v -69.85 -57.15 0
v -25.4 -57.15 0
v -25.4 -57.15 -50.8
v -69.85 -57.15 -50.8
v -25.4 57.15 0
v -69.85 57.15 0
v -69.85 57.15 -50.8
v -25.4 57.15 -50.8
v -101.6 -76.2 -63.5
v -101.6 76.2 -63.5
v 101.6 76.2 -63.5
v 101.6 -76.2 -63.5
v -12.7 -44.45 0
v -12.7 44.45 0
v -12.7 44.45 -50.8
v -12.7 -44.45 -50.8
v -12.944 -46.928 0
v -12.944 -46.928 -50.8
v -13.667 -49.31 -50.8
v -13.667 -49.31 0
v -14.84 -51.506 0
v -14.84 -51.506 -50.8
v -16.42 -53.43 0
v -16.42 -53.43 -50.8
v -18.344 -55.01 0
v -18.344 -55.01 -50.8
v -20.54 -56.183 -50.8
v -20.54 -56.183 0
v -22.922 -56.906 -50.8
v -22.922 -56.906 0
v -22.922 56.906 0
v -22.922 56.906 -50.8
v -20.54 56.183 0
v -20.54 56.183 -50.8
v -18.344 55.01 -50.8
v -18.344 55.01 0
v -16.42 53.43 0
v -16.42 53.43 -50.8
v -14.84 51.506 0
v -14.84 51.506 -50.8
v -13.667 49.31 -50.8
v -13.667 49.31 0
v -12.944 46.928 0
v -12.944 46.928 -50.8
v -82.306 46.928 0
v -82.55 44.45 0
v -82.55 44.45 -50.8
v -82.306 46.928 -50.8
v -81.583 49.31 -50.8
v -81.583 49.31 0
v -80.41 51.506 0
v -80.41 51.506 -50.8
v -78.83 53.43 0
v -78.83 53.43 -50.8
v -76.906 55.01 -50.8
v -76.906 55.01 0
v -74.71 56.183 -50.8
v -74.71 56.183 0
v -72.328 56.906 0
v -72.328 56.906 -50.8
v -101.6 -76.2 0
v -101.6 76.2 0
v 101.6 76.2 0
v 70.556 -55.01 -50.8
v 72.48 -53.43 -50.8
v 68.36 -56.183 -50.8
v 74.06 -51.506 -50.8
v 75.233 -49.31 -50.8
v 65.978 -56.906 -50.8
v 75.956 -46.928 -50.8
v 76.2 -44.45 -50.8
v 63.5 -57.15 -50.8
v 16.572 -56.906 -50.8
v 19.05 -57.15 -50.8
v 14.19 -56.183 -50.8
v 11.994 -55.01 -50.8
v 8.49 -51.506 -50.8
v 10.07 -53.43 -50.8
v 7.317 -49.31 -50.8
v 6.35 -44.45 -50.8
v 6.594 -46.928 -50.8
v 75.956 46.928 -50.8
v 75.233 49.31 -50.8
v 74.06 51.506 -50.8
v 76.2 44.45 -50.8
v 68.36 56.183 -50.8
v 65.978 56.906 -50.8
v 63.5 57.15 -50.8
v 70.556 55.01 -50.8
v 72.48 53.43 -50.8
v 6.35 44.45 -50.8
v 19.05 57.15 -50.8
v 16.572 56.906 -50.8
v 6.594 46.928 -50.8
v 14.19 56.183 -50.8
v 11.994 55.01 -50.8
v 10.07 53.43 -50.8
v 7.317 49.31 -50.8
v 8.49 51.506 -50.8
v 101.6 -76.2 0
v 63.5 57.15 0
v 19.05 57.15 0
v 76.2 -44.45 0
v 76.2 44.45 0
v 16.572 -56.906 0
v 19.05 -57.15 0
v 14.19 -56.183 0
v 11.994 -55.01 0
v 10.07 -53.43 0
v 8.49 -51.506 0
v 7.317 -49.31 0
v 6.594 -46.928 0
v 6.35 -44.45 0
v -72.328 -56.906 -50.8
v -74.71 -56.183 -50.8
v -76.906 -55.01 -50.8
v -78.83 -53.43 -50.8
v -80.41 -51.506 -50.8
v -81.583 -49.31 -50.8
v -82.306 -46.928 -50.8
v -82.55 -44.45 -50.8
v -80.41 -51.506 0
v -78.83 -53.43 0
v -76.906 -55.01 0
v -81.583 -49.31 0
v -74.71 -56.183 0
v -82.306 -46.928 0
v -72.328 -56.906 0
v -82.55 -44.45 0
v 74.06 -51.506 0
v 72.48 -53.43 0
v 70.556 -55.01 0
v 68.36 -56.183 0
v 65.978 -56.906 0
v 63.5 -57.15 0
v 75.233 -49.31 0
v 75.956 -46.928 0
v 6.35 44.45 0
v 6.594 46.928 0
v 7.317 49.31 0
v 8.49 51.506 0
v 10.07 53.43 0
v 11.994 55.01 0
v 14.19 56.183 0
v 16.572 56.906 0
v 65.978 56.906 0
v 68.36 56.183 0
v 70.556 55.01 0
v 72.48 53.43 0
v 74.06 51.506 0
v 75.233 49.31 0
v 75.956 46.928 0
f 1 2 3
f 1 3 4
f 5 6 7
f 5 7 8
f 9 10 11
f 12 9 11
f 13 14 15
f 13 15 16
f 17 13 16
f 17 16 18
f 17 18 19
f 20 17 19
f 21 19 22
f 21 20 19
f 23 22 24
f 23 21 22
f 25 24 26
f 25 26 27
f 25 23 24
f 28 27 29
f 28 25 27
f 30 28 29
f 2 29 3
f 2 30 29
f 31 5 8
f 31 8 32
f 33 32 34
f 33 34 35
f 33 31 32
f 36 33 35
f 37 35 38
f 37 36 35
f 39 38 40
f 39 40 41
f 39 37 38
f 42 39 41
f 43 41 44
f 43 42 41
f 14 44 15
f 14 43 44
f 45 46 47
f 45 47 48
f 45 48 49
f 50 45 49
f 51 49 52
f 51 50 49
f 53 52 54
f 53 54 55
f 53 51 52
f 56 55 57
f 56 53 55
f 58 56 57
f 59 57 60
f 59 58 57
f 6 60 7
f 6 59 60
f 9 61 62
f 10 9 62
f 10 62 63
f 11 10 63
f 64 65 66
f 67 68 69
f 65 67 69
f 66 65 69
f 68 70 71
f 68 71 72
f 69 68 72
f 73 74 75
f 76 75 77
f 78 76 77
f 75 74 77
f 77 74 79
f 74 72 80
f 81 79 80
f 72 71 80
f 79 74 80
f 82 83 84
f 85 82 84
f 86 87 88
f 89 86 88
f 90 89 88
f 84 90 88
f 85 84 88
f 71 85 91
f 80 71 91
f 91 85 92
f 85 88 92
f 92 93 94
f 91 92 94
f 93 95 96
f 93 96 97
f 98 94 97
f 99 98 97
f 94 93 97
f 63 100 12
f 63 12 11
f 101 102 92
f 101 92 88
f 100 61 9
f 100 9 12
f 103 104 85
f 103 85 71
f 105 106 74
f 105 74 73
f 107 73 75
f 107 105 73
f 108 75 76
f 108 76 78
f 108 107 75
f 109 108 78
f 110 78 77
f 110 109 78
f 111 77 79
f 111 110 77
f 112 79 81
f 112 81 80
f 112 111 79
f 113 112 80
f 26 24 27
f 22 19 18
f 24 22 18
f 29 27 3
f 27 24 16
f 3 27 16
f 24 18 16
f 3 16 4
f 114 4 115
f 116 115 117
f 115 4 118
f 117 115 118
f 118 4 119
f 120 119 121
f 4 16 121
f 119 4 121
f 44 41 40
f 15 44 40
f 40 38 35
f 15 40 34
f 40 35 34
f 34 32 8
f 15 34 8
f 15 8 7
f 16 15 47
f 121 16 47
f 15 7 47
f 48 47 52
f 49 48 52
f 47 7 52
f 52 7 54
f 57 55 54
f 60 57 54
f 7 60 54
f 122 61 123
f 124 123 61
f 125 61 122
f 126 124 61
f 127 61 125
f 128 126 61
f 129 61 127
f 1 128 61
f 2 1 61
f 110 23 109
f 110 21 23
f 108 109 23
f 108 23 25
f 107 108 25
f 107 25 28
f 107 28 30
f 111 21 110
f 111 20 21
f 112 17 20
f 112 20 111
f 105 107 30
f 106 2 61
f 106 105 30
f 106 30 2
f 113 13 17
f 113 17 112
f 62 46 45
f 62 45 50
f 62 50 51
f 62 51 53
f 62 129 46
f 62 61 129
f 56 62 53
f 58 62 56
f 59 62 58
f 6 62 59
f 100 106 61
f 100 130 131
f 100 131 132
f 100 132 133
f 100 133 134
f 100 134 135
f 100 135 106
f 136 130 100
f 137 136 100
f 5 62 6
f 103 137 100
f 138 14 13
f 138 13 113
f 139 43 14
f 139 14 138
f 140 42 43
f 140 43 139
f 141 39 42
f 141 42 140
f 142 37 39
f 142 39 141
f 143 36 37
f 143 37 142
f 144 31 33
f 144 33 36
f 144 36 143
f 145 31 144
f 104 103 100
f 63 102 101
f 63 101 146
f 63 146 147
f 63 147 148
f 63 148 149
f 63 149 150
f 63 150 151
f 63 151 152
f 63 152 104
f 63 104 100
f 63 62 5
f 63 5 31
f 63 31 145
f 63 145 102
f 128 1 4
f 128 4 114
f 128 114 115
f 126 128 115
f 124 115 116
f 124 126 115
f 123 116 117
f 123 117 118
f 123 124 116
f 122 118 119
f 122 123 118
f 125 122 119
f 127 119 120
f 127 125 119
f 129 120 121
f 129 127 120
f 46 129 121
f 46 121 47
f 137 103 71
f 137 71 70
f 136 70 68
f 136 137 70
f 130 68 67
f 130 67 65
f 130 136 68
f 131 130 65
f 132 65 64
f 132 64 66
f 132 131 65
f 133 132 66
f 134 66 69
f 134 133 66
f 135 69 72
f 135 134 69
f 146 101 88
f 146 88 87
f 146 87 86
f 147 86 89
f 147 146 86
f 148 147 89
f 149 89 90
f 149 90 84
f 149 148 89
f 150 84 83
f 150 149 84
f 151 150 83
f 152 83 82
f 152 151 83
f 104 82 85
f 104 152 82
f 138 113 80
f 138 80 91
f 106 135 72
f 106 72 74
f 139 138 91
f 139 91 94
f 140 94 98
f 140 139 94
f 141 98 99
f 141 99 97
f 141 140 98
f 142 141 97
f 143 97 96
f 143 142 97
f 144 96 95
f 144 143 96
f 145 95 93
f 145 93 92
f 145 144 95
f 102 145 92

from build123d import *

# Parameters (mm, degrees)
SKETCH1_W          = 203.2
SKETCH1_H          = 152.4
BASE_EXTRUDE_DEPTH = 63.5
CUT_EXTRUDE1_DEPTH = 50.8


with BuildPart() as part:
    # Sketch1 → Base-Extrude (new body)
    with BuildSketch(Plane.XY):
        Rectangle(SKETCH1_W, SKETCH1_H)
    extrude(amount=-BASE_EXTRUDE_DEPTH)

    # Sketch2 → Cut-Extrude1 (cut)
    with BuildSketch(Plane.XY):
        with BuildLine():
            Line((-69.85, 57.15), (-25.4, 57.15))
            ThreePointArc((-25.4, 57.15), (-16.419743879, 53.430256121), (-12.7, 44.45))
            Line((-12.7, 44.45), (-12.7, -44.45))
            ThreePointArc((-12.7, -44.45), (-16.419743879, -53.430256121), (-25.4, -57.15))
            Line((-25.4, -57.15), (-69.85, -57.15))
            ThreePointArc((-69.85, -57.15), (-78.830256121, -53.430256121), (-82.55, -44.45))
            Line((-82.55, -44.45), (-82.55, 44.45))
            ThreePointArc((-82.55, 44.45), (-78.830256121, 53.430256121), (-69.85, 57.15))
        make_face()
        with BuildLine():
            Line((19.05, 57.15), (63.5, 57.15))
            ThreePointArc((63.5, 57.15), (72.480256121, 53.430256121), (76.2, 44.45))
            Line((76.2, 44.45), (76.2, -44.45))
            ThreePointArc((76.2, -44.45), (72.480256121, -53.430256121), (63.5, -57.15))
            Line((63.5, -57.15), (19.05, -57.15))
            ThreePointArc((19.05, -57.15), (10.069743879, -53.430256121), (6.35, -44.45))
            Line((6.35, -44.45), (6.35, 44.45))
            ThreePointArc((6.35, 44.45), (10.069743879, 53.430256121), (19.05, 57.15))
        make_face()
    extrude(amount=-CUT_EXTRUDE1_DEPTH, mode=Mode.SUBTRACT)


solid = part.part
